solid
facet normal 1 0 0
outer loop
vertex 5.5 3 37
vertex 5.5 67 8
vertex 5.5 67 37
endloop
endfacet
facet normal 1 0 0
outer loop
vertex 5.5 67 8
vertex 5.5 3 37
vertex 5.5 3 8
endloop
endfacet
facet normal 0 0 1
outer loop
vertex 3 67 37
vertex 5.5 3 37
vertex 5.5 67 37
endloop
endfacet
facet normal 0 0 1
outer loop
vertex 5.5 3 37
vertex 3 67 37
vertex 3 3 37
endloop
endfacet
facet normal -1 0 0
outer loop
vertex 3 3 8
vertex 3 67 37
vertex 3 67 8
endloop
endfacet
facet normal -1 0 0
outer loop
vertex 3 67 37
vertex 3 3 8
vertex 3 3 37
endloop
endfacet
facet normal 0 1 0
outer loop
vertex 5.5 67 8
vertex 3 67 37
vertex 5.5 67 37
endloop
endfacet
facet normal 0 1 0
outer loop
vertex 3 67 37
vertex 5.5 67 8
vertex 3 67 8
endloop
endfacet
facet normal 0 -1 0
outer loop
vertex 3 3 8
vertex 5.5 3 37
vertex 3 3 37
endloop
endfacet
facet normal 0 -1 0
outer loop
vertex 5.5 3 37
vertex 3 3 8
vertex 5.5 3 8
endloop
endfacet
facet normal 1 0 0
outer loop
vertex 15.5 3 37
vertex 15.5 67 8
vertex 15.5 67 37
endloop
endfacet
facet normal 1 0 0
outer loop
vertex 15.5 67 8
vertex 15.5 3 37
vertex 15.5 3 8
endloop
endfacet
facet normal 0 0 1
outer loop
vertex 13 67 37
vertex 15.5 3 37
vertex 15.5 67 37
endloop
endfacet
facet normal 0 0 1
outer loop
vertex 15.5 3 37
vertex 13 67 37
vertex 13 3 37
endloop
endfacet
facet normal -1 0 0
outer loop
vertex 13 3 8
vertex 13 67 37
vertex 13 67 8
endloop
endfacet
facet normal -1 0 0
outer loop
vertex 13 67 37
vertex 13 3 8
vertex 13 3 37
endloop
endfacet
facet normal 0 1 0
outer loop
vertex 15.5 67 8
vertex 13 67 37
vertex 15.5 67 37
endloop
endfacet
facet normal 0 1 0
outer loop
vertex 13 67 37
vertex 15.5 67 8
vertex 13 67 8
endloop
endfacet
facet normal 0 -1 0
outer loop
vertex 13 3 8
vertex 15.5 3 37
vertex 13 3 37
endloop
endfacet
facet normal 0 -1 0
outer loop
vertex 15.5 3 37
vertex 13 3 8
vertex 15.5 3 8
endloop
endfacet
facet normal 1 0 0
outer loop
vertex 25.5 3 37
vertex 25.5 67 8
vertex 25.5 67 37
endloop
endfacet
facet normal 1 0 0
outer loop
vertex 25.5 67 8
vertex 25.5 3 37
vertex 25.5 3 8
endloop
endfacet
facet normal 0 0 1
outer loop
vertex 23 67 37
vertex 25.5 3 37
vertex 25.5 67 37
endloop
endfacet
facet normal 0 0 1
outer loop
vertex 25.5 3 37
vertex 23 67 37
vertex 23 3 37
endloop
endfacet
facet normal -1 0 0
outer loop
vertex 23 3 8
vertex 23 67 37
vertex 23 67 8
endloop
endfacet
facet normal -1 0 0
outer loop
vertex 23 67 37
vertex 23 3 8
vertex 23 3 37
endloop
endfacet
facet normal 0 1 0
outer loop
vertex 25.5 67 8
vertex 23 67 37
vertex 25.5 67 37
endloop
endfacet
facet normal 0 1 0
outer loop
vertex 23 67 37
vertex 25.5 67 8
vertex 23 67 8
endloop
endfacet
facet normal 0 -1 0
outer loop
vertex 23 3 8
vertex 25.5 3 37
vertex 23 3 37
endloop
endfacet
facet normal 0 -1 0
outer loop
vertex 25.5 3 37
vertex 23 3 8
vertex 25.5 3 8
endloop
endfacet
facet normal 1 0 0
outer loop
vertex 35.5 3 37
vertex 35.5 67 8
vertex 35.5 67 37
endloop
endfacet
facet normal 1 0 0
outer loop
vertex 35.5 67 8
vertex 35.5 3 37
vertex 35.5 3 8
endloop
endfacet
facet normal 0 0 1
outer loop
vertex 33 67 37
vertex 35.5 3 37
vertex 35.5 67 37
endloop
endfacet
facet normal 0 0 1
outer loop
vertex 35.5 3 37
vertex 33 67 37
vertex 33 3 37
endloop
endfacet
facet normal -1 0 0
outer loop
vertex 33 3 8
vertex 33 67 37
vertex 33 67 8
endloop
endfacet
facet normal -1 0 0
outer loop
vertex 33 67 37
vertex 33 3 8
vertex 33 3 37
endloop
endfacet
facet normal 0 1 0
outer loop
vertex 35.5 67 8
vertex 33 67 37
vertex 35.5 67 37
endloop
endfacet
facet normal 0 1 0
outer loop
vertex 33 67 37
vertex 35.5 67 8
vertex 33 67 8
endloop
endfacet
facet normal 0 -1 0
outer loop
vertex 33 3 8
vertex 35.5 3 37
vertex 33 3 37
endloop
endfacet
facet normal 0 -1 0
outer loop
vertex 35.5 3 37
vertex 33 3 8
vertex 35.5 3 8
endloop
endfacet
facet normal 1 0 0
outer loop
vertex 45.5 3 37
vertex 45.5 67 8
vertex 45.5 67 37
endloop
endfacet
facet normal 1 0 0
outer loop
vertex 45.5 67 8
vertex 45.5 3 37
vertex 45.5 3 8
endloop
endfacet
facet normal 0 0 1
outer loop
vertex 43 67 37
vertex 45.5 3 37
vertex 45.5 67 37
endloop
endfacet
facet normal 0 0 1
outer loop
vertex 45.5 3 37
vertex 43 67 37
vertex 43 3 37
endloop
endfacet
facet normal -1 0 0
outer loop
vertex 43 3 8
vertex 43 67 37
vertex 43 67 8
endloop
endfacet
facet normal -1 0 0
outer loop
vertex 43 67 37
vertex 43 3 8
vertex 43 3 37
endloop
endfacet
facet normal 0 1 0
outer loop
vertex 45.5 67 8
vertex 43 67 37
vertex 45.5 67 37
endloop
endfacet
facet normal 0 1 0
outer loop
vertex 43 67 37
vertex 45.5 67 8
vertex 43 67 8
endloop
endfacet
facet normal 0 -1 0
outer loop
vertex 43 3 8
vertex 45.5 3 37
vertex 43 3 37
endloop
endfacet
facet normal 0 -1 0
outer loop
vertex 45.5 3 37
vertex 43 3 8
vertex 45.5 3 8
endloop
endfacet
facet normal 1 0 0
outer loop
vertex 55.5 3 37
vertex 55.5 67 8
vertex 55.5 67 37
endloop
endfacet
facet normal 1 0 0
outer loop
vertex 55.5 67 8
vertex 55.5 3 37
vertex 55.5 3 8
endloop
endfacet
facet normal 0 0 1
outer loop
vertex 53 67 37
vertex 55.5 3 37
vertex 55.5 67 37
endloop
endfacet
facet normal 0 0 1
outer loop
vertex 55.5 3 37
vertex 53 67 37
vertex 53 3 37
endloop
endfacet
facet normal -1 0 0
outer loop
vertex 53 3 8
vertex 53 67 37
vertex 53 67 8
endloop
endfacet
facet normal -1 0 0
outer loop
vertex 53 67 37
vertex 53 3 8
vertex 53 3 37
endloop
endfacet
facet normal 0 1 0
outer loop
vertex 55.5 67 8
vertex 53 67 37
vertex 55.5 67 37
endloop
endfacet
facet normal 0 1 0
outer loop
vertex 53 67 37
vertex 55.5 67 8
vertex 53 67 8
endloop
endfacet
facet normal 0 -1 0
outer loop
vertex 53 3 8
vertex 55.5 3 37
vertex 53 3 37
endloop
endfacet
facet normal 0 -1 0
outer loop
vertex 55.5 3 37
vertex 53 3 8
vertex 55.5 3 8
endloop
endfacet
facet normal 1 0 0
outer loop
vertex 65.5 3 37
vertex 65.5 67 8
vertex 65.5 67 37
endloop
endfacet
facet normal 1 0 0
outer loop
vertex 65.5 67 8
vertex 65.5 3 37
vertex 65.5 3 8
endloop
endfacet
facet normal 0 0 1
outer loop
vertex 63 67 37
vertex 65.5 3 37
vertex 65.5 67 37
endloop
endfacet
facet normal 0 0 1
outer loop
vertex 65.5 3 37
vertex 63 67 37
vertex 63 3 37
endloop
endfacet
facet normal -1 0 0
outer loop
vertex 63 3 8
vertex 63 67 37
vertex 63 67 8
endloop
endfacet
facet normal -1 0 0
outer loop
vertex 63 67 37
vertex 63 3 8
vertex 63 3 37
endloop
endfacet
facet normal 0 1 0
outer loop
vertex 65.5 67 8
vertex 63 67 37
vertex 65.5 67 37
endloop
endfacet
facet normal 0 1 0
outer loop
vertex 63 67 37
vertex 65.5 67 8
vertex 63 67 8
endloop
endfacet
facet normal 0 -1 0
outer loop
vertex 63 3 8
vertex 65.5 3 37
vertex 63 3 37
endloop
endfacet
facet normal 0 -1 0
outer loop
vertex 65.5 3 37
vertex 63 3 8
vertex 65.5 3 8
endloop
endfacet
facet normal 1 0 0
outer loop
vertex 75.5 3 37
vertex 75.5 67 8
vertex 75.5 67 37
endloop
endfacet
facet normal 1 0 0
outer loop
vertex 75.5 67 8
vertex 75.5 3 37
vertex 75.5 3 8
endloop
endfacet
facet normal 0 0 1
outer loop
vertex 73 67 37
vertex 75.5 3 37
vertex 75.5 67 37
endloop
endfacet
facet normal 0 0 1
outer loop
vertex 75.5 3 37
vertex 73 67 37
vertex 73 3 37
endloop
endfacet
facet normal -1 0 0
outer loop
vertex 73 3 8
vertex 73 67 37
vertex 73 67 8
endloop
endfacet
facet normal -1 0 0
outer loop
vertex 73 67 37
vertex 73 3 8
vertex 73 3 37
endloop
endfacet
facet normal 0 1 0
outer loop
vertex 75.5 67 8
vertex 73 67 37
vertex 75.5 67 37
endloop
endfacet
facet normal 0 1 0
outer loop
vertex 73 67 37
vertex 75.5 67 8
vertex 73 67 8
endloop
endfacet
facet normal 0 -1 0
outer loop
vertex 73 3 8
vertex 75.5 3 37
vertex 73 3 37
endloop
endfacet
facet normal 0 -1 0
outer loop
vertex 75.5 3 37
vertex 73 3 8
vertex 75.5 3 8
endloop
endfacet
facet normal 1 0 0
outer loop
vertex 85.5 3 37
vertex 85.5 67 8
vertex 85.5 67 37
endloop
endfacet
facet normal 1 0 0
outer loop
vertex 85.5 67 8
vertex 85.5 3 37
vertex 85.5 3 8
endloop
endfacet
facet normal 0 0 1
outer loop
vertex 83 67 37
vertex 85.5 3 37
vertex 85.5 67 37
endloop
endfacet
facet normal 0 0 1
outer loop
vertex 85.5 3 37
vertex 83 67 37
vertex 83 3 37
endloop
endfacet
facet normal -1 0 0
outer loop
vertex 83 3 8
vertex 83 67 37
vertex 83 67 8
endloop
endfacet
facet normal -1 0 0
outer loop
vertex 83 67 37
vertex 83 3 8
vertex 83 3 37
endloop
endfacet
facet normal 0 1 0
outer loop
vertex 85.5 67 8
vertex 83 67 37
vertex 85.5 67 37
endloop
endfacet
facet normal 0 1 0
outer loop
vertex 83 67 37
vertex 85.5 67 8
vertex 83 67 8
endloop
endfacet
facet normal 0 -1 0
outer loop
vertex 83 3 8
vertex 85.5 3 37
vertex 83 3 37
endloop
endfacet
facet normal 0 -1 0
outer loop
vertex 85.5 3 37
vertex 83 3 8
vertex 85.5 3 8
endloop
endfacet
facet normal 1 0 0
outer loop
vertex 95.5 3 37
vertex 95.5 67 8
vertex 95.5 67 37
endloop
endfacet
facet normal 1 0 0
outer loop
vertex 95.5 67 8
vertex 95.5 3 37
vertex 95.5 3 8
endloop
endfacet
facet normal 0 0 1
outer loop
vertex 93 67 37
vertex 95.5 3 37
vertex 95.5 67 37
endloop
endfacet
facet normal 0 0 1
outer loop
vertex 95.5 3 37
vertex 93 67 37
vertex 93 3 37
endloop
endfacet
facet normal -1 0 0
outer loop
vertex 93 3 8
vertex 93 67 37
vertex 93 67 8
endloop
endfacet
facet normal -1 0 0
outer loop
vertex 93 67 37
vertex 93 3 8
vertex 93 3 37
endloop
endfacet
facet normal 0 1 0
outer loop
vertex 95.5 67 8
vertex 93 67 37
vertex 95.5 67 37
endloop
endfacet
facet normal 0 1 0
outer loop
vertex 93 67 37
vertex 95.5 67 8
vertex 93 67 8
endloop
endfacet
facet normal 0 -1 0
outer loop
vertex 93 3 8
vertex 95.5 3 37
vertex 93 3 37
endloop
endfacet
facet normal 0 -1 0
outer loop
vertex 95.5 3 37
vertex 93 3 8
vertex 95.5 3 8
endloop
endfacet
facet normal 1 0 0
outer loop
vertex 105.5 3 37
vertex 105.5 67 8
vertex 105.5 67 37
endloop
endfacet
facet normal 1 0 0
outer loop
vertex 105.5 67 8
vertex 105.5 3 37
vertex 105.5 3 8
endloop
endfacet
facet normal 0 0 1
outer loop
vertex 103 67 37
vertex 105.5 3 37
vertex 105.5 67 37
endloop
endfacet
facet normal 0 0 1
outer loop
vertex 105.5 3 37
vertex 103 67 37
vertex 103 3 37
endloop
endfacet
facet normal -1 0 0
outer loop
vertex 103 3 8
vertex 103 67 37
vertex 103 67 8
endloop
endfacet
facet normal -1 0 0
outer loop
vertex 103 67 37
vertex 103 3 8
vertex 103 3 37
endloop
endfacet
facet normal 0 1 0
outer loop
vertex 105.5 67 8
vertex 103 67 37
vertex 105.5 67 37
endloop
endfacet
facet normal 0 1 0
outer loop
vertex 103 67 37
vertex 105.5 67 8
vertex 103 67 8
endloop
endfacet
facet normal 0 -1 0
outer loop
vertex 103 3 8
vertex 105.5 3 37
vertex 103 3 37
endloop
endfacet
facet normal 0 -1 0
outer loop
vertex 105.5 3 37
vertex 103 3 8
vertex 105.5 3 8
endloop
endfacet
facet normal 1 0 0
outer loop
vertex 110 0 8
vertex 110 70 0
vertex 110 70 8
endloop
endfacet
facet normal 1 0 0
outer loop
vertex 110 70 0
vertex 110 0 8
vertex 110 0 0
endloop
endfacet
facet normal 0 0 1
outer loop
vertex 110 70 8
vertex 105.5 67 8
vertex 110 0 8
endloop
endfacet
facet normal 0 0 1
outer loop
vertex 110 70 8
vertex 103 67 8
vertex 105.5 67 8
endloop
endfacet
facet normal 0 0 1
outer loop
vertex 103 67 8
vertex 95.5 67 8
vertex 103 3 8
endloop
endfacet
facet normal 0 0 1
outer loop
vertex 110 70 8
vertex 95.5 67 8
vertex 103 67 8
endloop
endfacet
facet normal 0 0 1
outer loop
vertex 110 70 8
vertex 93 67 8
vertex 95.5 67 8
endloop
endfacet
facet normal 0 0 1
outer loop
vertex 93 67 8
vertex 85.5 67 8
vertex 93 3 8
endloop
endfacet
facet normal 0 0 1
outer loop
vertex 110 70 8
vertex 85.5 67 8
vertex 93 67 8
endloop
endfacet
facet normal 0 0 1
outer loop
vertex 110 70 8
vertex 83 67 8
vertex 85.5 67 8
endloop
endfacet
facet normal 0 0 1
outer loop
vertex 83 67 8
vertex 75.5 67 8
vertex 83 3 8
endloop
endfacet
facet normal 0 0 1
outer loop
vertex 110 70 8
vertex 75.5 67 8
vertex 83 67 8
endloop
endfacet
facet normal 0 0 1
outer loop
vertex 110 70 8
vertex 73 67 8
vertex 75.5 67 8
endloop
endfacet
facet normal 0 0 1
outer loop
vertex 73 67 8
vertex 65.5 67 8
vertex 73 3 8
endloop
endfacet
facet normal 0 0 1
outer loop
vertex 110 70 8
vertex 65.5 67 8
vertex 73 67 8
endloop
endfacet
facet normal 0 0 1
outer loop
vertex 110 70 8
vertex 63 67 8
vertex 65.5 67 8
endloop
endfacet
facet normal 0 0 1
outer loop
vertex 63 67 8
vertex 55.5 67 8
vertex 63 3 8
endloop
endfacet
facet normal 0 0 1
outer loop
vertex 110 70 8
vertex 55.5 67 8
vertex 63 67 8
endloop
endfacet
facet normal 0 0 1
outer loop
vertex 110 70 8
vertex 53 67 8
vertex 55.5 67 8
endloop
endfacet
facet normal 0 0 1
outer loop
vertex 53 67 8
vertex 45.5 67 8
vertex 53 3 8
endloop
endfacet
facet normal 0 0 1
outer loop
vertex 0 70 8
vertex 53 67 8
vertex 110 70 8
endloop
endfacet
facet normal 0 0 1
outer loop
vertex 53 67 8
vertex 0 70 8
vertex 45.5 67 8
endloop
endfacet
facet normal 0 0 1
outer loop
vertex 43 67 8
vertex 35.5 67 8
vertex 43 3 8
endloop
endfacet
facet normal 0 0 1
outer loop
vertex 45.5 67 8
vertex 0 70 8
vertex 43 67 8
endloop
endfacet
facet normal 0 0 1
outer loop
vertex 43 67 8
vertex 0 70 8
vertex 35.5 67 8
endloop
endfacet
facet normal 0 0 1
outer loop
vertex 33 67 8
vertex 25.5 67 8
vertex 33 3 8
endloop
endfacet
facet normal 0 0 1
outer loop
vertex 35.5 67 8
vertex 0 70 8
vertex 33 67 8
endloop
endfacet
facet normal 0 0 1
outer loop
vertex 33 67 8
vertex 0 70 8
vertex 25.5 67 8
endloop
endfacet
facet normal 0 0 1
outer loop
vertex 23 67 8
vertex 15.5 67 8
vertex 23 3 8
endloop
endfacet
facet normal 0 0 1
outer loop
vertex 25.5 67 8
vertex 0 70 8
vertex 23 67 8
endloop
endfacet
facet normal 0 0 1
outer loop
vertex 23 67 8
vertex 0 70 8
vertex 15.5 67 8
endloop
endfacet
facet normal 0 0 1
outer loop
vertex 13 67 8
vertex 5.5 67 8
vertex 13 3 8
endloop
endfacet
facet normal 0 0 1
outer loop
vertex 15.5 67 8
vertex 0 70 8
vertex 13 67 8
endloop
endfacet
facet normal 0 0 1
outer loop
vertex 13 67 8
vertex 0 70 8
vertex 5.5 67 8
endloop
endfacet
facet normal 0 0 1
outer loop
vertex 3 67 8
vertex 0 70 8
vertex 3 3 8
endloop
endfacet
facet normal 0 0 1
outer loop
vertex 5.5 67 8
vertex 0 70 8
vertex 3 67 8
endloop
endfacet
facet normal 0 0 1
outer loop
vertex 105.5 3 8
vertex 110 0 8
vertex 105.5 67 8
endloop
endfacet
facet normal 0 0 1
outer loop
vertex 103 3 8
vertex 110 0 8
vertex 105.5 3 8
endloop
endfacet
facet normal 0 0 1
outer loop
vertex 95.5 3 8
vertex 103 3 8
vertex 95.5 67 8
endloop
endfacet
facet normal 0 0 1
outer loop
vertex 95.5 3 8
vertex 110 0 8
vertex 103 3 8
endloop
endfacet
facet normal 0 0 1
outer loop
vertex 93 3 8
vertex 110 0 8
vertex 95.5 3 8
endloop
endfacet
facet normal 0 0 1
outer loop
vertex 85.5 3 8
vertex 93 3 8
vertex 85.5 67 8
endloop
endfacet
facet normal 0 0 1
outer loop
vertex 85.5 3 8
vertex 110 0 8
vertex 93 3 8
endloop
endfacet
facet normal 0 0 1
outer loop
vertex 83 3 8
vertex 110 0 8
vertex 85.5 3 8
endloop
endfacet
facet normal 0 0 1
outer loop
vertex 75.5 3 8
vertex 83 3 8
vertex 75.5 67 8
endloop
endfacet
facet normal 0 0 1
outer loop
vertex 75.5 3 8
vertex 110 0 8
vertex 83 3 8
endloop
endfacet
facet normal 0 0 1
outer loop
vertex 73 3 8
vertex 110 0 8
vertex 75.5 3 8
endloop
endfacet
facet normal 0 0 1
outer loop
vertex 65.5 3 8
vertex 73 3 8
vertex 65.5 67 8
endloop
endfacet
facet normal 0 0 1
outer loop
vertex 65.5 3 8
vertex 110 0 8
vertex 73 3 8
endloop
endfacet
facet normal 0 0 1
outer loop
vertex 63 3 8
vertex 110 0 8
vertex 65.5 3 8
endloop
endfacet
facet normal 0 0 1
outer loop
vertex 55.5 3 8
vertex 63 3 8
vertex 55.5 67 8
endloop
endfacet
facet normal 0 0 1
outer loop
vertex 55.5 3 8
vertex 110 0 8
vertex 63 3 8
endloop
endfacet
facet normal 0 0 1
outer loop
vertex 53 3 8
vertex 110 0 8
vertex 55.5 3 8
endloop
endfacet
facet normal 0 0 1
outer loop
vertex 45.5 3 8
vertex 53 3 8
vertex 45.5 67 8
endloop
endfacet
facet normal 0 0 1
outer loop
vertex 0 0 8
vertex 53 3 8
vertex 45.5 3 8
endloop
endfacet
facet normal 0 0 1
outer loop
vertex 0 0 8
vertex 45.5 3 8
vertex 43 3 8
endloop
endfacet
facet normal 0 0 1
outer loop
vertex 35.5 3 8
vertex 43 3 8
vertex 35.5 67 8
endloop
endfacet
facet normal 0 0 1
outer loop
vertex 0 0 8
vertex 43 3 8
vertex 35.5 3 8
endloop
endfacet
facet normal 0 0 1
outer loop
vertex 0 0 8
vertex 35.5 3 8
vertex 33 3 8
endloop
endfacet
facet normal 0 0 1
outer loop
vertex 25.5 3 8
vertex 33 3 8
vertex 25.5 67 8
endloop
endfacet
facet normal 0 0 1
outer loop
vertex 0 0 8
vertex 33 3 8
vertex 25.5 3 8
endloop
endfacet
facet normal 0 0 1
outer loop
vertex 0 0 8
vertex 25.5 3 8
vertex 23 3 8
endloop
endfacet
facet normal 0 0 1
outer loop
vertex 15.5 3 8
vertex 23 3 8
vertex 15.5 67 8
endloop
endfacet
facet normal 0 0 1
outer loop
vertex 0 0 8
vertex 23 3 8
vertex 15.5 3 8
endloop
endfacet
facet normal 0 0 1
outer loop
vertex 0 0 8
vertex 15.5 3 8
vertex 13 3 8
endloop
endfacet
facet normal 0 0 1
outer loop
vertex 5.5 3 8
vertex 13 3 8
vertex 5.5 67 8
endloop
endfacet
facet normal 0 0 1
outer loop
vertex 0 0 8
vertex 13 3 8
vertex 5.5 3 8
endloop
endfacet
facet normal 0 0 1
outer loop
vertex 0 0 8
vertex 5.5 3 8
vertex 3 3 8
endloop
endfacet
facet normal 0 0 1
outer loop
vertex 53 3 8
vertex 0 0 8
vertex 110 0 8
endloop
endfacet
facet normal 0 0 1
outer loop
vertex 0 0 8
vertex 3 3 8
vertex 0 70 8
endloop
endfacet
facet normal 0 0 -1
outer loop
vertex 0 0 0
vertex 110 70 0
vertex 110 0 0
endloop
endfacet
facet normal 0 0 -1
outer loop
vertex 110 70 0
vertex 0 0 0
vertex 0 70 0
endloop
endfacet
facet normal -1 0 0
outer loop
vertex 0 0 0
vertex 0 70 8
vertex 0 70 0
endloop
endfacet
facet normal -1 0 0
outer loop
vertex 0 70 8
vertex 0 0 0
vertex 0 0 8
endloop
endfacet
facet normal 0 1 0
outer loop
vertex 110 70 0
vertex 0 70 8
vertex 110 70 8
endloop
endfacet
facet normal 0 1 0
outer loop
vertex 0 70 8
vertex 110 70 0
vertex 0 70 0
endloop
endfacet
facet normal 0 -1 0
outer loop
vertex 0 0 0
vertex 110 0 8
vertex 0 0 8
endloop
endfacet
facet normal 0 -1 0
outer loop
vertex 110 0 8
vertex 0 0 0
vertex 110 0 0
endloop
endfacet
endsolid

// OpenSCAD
$fn = 32;

// ----------------------------------------------------------------------
// Heatsink: uniform fin block
// ----------------------------------------------------------------------

// --- parameters (mm) ---
base_l = 110;             // base length, X
base_w = 70;              // base width, Y
base_t = 8;               // base plate thickness
fin_h = 30;               // fin height above the base
fin_t = 2.5;              // fin thickness
edge = 3;                 // margin from the base ends
pitch = 10;               // fin pitch

n_fins = floor((base_l - 2 * edge - fin_t) / pitch) + 1;  // fin count
total_h = base_t + fin_h - 1;  // overall height

union() {
  cube([base_l, base_w, base_t]);
  for (i = [0 : n_fins - 1])
    translate([edge + i * pitch, edge, base_t - 1])
      cube([fin_t, base_w - 2 * edge, fin_h]);
}
